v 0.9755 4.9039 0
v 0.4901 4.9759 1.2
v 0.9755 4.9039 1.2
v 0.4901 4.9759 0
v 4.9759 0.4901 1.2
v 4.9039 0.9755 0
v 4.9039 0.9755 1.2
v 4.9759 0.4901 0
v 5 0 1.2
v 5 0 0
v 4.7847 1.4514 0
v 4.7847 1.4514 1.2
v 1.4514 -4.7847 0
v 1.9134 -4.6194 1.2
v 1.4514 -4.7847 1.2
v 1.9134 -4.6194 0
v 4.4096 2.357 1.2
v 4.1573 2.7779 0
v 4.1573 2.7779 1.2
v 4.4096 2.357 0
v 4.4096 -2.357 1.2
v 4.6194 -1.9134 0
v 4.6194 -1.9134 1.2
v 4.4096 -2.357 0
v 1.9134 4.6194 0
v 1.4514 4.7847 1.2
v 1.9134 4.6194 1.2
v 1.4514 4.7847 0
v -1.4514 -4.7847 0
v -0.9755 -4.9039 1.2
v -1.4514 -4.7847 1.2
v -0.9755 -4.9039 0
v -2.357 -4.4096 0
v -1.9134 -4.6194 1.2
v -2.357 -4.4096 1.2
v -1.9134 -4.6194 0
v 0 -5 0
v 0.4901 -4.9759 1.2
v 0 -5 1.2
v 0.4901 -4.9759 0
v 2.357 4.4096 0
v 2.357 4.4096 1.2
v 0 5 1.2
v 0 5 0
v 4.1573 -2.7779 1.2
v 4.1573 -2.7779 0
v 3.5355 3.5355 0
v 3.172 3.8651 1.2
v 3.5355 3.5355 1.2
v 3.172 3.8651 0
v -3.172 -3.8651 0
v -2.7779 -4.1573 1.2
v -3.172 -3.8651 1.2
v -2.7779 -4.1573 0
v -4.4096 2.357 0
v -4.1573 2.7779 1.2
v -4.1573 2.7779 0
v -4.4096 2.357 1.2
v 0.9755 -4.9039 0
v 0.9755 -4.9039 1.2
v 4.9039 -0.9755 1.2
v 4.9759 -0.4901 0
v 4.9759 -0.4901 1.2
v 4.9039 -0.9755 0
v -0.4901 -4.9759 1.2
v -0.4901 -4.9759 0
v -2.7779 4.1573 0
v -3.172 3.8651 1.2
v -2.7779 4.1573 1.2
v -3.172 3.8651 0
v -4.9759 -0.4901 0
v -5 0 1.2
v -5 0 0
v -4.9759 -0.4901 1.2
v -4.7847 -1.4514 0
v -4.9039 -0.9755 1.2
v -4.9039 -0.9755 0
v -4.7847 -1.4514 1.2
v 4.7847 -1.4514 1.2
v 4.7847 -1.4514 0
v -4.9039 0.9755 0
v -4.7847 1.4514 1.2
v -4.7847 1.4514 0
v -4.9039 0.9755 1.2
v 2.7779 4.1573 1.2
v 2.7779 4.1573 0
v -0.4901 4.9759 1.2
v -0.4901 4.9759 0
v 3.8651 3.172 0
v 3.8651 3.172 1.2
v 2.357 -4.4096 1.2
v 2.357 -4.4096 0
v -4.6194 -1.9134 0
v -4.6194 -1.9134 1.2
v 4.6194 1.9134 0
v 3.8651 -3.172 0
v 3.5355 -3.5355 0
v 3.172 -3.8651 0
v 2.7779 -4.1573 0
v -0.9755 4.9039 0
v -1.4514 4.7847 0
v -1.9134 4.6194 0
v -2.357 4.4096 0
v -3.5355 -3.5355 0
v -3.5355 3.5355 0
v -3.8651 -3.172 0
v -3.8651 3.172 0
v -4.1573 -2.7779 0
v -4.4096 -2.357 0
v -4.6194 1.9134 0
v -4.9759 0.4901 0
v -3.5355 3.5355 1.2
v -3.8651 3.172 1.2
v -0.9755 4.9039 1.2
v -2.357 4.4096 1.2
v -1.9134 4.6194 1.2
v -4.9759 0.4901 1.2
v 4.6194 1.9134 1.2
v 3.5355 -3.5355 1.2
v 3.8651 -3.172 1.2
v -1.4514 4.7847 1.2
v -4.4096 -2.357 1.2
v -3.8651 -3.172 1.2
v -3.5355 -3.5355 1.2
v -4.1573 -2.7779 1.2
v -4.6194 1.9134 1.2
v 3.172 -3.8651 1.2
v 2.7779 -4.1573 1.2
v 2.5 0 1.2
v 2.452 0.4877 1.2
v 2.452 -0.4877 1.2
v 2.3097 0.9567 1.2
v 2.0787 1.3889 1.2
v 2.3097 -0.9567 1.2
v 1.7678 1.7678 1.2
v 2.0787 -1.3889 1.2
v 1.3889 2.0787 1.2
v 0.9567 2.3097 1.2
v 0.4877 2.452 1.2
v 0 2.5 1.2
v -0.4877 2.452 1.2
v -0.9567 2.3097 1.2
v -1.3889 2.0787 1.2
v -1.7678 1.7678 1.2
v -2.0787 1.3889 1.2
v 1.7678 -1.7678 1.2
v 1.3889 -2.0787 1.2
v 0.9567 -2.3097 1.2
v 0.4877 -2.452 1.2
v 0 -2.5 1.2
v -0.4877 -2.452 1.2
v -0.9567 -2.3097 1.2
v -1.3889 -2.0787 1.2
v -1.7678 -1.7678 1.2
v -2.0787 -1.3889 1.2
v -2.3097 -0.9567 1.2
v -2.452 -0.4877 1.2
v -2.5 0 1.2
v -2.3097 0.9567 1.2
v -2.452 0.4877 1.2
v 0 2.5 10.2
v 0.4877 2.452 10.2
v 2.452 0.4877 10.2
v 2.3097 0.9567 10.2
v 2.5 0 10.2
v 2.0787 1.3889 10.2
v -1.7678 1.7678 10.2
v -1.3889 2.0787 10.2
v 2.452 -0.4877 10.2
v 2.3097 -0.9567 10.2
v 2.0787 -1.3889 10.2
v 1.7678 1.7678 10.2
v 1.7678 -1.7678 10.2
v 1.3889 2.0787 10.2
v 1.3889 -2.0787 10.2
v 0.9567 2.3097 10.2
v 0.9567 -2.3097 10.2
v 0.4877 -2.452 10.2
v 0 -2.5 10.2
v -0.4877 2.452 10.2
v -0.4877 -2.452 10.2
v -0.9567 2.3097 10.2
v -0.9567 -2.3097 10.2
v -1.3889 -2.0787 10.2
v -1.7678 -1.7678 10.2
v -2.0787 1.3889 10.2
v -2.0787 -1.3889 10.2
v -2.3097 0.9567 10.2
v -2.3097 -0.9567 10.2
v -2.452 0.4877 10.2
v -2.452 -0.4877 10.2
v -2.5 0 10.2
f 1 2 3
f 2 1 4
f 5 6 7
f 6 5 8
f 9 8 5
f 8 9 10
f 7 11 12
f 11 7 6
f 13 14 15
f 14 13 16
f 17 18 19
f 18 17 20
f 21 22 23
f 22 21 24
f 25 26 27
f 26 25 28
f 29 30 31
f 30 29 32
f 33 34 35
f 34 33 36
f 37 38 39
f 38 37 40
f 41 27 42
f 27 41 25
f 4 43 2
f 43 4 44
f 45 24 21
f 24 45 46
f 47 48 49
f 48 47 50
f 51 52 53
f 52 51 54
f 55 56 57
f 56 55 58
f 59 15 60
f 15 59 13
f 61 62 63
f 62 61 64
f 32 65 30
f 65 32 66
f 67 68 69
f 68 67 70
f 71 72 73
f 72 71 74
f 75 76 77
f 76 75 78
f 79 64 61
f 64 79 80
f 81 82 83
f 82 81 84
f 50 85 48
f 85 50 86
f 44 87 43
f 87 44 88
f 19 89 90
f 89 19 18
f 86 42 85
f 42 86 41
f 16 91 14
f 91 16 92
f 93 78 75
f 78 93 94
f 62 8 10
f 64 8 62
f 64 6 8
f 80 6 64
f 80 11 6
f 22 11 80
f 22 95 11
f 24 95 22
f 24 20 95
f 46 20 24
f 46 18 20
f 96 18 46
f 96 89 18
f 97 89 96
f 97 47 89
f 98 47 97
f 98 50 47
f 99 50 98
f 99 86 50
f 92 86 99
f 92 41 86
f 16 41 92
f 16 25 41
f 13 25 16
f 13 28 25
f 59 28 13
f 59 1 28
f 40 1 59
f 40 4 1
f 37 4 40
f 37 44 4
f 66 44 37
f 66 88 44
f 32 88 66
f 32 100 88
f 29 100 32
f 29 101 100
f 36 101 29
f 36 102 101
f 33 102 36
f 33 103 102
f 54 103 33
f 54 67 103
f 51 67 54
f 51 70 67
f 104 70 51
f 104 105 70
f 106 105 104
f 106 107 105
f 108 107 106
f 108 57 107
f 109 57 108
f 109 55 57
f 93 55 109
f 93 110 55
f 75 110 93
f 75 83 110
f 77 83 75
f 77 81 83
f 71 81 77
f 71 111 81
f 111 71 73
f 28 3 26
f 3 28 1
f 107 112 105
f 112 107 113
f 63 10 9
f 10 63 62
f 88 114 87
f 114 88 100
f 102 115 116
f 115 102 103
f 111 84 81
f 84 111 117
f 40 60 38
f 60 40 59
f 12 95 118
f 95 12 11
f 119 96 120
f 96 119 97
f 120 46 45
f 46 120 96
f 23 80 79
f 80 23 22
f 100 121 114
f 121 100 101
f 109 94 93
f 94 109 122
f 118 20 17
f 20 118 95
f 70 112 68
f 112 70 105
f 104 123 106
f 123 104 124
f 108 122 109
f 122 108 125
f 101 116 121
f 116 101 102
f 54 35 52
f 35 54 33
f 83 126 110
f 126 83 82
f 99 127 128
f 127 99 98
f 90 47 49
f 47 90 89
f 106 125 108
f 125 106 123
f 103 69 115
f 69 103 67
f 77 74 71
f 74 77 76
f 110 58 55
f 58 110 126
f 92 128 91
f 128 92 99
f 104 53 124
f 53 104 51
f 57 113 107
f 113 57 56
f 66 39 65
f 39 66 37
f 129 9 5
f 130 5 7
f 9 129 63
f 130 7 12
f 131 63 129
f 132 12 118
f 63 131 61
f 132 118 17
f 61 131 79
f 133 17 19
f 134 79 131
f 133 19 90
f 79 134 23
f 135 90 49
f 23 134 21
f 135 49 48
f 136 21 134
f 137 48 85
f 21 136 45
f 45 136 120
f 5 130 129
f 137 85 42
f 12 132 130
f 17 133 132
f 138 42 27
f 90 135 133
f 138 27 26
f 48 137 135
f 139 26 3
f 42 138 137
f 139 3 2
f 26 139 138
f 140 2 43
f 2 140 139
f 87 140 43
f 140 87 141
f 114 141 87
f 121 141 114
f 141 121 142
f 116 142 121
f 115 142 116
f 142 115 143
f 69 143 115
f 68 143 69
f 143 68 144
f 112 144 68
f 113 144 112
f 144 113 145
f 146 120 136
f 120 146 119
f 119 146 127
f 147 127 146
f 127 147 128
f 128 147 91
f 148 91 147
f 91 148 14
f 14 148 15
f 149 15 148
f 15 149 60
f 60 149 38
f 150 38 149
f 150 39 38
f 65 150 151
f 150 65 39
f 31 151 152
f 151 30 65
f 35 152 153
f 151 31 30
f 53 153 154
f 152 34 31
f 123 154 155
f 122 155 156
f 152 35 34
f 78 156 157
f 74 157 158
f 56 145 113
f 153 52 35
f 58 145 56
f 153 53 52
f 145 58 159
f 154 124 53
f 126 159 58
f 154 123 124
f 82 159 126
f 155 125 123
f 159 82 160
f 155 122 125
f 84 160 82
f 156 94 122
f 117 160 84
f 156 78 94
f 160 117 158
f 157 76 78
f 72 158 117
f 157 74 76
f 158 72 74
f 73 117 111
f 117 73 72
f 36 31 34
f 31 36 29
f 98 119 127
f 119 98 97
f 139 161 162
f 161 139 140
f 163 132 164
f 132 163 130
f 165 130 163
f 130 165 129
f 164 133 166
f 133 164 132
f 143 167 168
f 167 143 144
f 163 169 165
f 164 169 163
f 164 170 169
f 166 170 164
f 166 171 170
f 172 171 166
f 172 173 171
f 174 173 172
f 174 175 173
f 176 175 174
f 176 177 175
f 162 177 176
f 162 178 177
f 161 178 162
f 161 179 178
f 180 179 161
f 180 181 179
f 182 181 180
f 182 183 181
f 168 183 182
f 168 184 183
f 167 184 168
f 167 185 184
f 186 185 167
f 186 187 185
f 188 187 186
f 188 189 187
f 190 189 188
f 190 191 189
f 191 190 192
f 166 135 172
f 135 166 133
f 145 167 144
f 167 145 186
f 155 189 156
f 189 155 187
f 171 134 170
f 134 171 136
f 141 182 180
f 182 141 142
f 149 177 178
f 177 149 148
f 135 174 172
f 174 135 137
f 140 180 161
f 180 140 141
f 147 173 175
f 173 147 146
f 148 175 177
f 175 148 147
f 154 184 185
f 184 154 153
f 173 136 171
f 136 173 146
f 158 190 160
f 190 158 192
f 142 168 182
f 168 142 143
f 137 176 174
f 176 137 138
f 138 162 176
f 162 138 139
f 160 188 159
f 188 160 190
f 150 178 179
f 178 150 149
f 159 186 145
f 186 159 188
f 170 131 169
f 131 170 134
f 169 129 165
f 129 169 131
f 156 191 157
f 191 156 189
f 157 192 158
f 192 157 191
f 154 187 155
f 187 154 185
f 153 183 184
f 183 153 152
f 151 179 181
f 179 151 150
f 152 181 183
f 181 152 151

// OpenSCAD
// file: BrakeSensorHolderVars.scad
ringInnerDiameter=6;
ringOuterDiameter=10;
ringHeight=2;

holderHeight=8;
brakeHandleWidth=13;
length=7;

letchHeight=8;
letchWidth=1.2;

zipTieWidth=3;
zipTieThickness=2;
zipTieHoleOffset=2;

cylinderHeadHeight=1.2;

innerCylinderDiameter=ringInnerDiameter-1.0;
ringHolderOffset=(brakeHandleWidth-ringOuterDiameter)/2;
// main file
include <BrakeSensorHolderVars.scad>

union()
{
	cylinder(d=ringOuterDiameter,h=cylinderHeadHeight,$fn=64);
	
	cylinder(d=innerCylinderDiameter,h=cylinderHeadHeight+ringHeight+length,$fn=32);
}
